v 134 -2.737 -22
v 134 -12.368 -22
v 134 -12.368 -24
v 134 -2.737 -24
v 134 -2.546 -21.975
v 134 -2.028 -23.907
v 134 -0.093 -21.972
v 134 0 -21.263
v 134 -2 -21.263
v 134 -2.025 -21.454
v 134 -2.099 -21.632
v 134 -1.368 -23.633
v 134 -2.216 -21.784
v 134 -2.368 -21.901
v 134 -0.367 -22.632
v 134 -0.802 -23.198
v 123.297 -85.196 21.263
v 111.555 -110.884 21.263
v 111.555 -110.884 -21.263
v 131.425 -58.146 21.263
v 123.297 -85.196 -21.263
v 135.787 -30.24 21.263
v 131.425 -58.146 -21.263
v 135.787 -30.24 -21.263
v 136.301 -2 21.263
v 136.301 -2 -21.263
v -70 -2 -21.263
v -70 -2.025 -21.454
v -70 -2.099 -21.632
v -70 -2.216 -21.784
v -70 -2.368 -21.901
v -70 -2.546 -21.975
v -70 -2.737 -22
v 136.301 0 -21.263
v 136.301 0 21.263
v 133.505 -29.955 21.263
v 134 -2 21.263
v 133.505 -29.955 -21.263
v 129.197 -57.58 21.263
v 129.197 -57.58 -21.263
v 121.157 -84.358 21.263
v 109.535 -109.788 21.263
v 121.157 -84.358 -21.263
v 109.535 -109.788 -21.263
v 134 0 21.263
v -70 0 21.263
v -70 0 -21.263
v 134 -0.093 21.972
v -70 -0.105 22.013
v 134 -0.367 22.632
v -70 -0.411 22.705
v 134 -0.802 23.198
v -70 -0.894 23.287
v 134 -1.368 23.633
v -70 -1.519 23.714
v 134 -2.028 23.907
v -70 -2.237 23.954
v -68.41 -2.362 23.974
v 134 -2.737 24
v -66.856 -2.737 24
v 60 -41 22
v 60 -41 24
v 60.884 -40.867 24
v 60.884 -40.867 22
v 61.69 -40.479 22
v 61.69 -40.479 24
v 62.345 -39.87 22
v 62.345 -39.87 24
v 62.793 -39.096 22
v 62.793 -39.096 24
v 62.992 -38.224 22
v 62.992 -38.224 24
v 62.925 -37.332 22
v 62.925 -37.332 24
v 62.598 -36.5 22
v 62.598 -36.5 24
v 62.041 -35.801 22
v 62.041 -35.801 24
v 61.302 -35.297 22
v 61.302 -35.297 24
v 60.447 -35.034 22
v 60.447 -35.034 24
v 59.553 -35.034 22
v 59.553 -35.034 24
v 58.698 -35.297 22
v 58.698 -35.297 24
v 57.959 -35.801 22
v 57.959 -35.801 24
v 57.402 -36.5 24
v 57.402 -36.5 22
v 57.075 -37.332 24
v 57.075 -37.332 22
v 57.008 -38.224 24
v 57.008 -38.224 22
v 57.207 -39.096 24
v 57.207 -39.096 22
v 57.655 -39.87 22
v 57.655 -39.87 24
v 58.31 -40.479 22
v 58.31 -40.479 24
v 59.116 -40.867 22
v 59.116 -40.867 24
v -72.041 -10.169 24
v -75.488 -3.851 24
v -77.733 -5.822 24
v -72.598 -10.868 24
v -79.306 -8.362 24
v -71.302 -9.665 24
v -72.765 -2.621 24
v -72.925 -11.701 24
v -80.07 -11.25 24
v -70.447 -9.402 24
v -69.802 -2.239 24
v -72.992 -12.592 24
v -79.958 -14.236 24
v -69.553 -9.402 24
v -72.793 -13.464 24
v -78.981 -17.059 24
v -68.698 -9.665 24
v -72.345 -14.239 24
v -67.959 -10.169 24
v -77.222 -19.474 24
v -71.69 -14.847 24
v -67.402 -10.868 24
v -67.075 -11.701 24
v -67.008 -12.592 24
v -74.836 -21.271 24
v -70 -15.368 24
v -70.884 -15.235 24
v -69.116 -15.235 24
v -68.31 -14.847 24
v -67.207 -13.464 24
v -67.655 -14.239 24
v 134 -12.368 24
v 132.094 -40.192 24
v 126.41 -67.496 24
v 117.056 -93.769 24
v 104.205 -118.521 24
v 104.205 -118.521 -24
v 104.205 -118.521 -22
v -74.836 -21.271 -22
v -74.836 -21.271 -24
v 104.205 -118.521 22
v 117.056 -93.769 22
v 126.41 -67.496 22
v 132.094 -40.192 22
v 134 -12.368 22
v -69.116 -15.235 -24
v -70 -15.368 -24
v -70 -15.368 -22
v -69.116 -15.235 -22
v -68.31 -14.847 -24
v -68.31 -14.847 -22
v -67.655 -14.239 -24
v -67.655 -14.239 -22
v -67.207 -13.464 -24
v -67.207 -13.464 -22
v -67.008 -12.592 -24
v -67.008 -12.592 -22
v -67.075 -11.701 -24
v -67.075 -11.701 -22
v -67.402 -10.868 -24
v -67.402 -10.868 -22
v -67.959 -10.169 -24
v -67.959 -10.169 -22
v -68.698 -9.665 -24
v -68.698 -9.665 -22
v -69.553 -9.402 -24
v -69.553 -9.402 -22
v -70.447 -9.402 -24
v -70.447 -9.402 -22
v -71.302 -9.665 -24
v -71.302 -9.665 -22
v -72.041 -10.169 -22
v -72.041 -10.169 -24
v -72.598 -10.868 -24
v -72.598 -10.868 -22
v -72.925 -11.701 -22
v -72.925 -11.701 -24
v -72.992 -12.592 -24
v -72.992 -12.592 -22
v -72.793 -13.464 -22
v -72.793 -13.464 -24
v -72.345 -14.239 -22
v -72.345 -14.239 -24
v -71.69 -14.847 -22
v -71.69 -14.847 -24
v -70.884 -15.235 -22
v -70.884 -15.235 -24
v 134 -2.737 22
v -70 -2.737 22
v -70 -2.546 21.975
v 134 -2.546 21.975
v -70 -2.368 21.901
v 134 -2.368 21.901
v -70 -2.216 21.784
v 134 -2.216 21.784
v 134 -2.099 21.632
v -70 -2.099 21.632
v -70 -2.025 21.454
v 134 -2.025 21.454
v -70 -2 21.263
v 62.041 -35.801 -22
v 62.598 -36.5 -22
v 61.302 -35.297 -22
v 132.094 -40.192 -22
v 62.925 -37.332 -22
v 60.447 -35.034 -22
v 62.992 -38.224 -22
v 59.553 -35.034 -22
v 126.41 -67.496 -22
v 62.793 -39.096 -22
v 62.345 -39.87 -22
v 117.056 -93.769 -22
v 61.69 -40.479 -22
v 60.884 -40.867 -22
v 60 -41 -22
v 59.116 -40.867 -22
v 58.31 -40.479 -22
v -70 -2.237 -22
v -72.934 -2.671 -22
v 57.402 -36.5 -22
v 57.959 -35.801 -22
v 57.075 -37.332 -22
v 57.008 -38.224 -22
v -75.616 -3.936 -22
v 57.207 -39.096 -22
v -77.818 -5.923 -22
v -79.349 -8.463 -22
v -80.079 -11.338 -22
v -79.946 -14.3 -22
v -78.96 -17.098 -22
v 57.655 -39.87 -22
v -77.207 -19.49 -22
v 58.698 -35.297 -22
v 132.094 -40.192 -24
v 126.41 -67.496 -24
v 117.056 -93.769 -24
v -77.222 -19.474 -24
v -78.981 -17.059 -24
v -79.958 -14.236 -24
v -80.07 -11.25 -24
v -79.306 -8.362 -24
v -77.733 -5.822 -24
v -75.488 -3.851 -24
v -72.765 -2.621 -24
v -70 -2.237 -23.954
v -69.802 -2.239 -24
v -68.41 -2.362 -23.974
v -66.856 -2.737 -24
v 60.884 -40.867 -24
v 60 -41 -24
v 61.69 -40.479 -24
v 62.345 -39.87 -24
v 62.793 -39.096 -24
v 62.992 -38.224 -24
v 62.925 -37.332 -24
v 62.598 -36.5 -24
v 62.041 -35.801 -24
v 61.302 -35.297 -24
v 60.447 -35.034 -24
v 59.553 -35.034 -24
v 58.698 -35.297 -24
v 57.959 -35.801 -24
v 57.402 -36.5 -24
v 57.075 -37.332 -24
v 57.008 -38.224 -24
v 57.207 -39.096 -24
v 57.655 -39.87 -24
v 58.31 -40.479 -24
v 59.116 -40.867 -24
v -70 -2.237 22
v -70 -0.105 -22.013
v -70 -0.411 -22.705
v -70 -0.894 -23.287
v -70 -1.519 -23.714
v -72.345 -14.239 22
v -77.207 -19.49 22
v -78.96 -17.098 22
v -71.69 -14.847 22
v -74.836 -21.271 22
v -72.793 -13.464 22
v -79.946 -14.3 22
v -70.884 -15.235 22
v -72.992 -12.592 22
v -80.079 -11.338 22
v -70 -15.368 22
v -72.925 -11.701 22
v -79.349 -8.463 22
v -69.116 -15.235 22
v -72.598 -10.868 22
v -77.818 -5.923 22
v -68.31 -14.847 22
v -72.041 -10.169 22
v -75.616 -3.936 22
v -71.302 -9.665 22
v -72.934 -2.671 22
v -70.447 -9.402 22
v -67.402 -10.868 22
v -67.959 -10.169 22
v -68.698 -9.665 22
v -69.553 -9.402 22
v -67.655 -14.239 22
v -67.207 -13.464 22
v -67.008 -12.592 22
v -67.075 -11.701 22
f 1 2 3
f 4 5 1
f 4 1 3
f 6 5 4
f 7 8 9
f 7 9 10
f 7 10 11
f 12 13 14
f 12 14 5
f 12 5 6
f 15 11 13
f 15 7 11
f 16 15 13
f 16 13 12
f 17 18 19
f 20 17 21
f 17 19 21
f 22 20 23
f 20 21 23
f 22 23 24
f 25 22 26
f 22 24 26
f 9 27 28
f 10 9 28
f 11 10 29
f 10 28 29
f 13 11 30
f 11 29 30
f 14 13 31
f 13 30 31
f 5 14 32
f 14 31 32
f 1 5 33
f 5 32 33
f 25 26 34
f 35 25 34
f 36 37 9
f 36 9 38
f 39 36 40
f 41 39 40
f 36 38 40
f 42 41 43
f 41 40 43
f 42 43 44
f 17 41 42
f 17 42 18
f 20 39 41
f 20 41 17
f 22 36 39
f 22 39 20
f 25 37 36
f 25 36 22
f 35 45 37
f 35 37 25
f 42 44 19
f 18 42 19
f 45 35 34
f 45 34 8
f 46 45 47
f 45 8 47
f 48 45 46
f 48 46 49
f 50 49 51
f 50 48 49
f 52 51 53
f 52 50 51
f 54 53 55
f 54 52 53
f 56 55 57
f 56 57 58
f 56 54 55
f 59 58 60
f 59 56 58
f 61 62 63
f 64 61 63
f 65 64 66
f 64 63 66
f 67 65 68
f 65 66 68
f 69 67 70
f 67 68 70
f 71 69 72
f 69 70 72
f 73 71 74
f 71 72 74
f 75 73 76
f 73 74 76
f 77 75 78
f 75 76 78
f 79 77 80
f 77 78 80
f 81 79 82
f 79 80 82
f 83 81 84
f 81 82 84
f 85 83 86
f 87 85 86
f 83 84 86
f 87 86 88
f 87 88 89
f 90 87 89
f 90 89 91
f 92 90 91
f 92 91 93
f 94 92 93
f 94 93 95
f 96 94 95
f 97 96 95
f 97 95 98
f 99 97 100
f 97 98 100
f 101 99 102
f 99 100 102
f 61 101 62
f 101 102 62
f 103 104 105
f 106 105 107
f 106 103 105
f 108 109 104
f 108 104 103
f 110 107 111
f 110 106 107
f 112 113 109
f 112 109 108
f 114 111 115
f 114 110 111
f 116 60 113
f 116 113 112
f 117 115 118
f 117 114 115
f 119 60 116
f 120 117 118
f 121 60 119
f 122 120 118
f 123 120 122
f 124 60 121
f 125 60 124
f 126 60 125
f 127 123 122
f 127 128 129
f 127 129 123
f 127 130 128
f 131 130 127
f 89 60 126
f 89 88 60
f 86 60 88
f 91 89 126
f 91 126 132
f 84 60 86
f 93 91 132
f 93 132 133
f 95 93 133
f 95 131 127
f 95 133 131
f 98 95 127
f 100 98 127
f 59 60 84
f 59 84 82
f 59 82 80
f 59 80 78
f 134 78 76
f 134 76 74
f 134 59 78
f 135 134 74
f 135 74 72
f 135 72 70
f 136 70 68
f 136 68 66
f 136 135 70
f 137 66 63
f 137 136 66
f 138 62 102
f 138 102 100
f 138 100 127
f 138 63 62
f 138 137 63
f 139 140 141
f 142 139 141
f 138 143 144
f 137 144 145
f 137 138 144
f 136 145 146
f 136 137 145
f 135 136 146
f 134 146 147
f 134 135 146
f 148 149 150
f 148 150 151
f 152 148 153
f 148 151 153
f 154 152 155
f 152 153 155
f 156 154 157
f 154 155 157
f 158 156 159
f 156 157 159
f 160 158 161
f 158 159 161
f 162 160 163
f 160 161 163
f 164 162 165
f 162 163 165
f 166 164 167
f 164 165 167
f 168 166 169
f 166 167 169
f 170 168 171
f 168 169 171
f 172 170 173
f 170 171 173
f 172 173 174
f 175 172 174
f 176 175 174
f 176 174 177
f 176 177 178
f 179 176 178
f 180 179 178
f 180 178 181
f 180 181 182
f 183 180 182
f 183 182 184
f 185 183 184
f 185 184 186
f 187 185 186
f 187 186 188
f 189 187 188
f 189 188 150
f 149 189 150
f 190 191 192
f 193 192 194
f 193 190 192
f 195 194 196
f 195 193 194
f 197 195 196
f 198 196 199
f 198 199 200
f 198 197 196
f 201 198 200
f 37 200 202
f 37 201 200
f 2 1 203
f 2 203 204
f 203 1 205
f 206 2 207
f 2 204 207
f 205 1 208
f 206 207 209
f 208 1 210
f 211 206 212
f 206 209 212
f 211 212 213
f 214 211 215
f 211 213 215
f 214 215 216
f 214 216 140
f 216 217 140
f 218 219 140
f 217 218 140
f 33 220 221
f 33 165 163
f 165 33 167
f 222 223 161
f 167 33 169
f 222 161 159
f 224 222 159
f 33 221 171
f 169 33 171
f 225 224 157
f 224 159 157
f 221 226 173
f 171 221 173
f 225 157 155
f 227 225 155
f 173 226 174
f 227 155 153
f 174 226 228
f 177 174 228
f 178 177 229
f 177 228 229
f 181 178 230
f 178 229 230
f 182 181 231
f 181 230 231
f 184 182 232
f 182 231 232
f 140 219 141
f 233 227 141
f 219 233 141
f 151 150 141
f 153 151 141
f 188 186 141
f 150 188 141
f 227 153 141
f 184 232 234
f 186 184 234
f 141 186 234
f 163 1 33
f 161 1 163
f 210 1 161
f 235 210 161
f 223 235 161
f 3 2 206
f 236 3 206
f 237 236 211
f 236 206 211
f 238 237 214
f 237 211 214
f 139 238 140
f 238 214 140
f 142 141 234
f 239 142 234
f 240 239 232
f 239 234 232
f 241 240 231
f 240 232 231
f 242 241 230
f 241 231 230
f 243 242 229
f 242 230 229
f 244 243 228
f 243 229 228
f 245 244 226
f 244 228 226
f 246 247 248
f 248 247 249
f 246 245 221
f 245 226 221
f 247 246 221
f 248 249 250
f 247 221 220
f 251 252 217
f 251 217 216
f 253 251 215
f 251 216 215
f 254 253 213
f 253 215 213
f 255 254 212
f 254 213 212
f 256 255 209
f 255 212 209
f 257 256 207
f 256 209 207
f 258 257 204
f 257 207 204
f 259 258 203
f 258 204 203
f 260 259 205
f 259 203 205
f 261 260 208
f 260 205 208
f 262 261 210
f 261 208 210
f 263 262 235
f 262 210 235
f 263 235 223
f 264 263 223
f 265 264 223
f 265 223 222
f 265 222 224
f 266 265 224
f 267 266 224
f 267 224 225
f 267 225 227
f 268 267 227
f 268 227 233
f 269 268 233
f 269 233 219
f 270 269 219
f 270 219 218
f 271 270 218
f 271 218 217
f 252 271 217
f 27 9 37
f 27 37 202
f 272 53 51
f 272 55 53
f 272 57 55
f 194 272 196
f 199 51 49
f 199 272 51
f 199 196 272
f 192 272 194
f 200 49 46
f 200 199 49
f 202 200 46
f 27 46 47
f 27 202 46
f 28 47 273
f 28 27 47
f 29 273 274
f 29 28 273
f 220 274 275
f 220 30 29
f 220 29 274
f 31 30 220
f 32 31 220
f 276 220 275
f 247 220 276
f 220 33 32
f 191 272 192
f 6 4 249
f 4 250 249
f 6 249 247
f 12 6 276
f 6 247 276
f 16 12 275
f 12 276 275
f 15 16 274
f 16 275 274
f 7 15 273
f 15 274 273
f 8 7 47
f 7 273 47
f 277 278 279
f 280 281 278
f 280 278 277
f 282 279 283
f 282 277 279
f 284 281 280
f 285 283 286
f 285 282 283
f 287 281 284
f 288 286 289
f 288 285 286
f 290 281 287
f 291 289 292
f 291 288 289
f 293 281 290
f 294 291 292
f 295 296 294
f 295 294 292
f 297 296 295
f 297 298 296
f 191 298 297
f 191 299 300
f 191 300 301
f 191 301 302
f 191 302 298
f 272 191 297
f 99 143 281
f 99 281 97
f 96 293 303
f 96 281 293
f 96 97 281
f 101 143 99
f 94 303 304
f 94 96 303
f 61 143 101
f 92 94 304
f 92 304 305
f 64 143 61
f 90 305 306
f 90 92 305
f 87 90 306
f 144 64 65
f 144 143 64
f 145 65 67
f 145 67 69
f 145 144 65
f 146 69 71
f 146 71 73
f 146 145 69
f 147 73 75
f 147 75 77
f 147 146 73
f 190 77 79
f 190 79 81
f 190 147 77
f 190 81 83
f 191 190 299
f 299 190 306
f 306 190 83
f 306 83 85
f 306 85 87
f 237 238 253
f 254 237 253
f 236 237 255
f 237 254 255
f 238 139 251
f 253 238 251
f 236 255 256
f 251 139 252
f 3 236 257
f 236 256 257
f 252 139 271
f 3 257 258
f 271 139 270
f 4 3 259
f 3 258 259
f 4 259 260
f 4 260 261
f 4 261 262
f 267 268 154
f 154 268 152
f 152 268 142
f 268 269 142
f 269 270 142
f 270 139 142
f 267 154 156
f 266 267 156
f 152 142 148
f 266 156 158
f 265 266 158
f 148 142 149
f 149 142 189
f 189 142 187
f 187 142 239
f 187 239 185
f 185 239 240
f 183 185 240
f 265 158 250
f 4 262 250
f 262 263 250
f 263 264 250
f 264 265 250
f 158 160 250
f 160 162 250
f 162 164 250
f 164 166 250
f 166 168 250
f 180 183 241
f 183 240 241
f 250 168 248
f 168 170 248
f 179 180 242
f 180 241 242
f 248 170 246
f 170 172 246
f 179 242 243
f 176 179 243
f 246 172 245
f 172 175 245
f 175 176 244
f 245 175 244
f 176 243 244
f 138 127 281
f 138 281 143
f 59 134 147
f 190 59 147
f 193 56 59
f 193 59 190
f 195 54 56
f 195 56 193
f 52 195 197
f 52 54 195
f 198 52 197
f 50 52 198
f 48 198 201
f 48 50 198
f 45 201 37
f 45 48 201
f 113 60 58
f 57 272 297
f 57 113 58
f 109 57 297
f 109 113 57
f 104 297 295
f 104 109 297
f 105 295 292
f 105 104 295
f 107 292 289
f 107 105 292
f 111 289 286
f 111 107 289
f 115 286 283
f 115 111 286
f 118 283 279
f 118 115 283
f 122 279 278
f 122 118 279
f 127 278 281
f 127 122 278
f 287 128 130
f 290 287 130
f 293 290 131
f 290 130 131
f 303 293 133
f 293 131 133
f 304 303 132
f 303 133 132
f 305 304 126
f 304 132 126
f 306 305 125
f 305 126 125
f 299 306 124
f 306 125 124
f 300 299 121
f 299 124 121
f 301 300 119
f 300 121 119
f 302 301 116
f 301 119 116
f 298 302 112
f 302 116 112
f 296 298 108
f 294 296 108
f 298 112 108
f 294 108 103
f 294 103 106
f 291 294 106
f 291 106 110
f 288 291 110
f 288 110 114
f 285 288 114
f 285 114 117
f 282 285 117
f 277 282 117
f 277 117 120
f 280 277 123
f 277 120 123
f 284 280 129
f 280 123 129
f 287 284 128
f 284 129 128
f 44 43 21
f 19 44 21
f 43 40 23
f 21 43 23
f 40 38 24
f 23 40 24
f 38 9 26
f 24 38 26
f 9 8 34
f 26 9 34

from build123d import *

# Parameters (mm, degrees)
BASE_FLANGE1_DEPTH           = 2
EDGE_FLANGE1_STRIP_CUT_DEPTH = 140
EDGE_FLANGE1_DEPTH           = 140
EDGE_FLANGE2_STRIP_CUT_DEPTH = 140
EDGE_FLANGE2_DEPTH           = 140
BOSS_EXTRUDE1_DEPTH          = 2
BOSS_EXTRUDE2_START          = -2
BOSS_EXTRUDE2_DEPTH          = 2
SKETCH14_R                   = 10.1317
BOSS_EXTRUDE3_DEPTH          = 2
BOSS_EXTRUDE4_START          = -2
SKETCH15_R                   = 10.131700000000007
BOSS_EXTRUDE4_DEPTH          = 2
FILLET1_R                    = 20
SKETCH16_R                   = 3.0000000000000084
SKETCH16_R_2                 = 3.000000000000008
CUT_EXTRUDE1_DEPTH           = 116.00000000000001
BOSS_EXTRUDE5_DEPTH          = 2
BOSS_EXTRUDE6_DEPTH          = 64
BOSS_EXTRUDE8_START          = 64
BOSS_EXTRUDE8_DEPTH          = 64
SKETCH38_R                   = 3.000000000000008
SKETCH38_R_2                 = 2.9999999999999947
BOSS_EXTRUDE9_DEPTH          = 2
BOSS_EXTRUDE10_START         = -2
SKETCH40_R                   = 3.0000000000000084
BOSS_EXTRUDE10_DEPTH         = 2
CUT_EXTRUDE2_START           = -90
CUT_EXTRUDE2_DEPTH           = 90
SKETCH42_W                   = 17.233890077557817
SKETCH42_H                   = 15.447994732733191
CUT_EXTRUDE3_DEPTH           = 90
BOSS_EXTRUDE11_DEPTH         = 42.5268


# Sheet-metal steps are written as plain solids
with BuildPart() as part:
    # Sketch1 → Base-Flange1 (new body)
    with BuildSketch(Plane(origin=(0, 0, 0), x_dir=(1, 0, 0), z_dir=(0, 1, 0))):
        Polygon((69.99999999999999, 24.000000000000007), (-70.00000000000003, 23.99999999999999), (-70.00000000000003, -24.000000000000018), (69.99999999999999, -24), align=None)
    extrude(amount=-BASE_FLANGE1_DEPTH)

    # Edge-Flange1 strip (across the edge) → Edge-Flange1 strip cut (cut)
    with BuildSketch(Plane(origin=(69.99999999999999, -2, 24), x_dir=(-1.2e-16, -3.49e-15, -1), z_dir=(-1, 0, 1.2e-16))):
        Polygon((-6.736600000000024, -2.0000000000000235), (2.73660000000001, -1.9999999999999907), (2.736600000000003, 9.55e-15), (-6.736600000000031, -2.353e-14), align=None)
    extrude(amount=EDGE_FLANGE1_STRIP_CUT_DEPTH, mode=Mode.SUBTRACT)

    # Edge-Flange1 section (across the edge) → Edge-Flange1 (add)
    with BuildSketch(Plane(origin=(69.99999999999999, -2, 24), x_dir=(-1.2e-16, -3.49e-15, -1), z_dir=(-1, 0, 1.2e-16))):
        with BuildLine():
            Line((0, 0.7366000000000096), (0, 20.000000000000004))
            Line((0, 20.000000000000004), (2, 20.000000000000004))
            Line((2, 20.000000000000004), (2, 0.7366000000000096))
            ThreePointArc((2, 0.7366000000000096), (2.21574514497799, 0.21574514497799768), (2.736600000000003, 9.55e-15))
            Line((2.736600000000003, 9.55e-15), (2.73660000000001, -1.9999999999999907))
            ThreePointArc((2.73660000000001, -1.9999999999999907), (0.8015315826048977, -1.1984684173951), (0, 0.7366000000000096))
        make_face()
    extrude(amount=EDGE_FLANGE1_DEPTH)

    # Edge-Flange2 strip (across the edge) → Edge-Flange2 strip cut (cut)
    with BuildSketch(Plane(origin=(-70.00000000000003, -2, -23.999999999999993), x_dir=(1.2e-16, -3.49e-15, 1), z_dir=(1, 0, -1.2e-16))):
        Polygon((-6.736600000000024, -2.0000000000000235), (2.73660000000001, -1.9999999999999907), (2.736600000000003, 9.55e-15), (-6.736600000000031, -2.353e-14), align=None)
    extrude(amount=EDGE_FLANGE2_STRIP_CUT_DEPTH, mode=Mode.SUBTRACT)

    # Edge-Flange2 section (across the edge) → Edge-Flange2 (add)
    with BuildSketch(Plane(origin=(-70.00000000000003, -2, -23.999999999999993), x_dir=(1.2e-16, -3.49e-15, 1), z_dir=(1, 0, -1.2e-16))):
        with BuildLine():
            Line((0, 0.7366000000000096), (0, 20.000000000000004))
            Line((0, 20.000000000000004), (2, 20.000000000000004))
            Line((2, 20.000000000000004), (2, 0.7366000000000096))
            ThreePointArc((2, 0.7366000000000096), (2.21574514497799, 0.21574514497799768), (2.736600000000003, 9.55e-15))
            Line((2.736600000000003, 9.55e-15), (2.73660000000001, -1.9999999999999907))
            ThreePointArc((2.73660000000001, -1.9999999999999907), (0.8015315826048977, -1.1984684173951), (0, 0.7366000000000096))
        make_face()
    extrude(amount=EDGE_FLANGE2_DEPTH)

    # Sketch12 → Boss-Extrude1 (add)
    with BuildSketch(Plane.XY.offset(24)):
        with BuildLine():
            Line((69.99999999999997, -38.00000000000009), (69.99999999999997, -5.0936152776594525))
            Line((69.99999999999997, -5.0936152776594525), (49.99999999999997, -5.093615277659455))
            Line((49.99999999999997, -5.093615277659455), (49.99999999999997, -38.00000000000009))
            ThreePointArc((49.99999999999997, -38.00000000000009), (59.99999999999997, -48.000000000000085), (69.99999999999997, -38.00000000000009))
        make_face()
    extrude(amount=-BOSS_EXTRUDE1_DEPTH)

    # Sketch13 → Boss-Extrude2 (add)
    with BuildSketch(Plane(origin=(-2.97e-15, 8.743e-14, -23.999999999999986), x_dir=(-1, 0, 1.2e-16), z_dir=(-1.2e-16, 3.63e-15, -1)).offset(BOSS_EXTRUDE2_START)):
        with BuildLine():
            Line((-49.99999999999997, -21.999999999999922), (-49.99999999999997, -2.736599999999933))
            Line((-49.99999999999997, -2.736599999999933), (-69.99999999999999, -2.7365999999999113))
            Line((-69.99999999999999, -2.7365999999999113), (-69.99999999999997, -37.99999999999992))
            ThreePointArc((-69.99999999999997, -37.99999999999992), (-59.99999999999997, -47.999999999999915), (-49.99999999999997, -37.999999999999915))
            Line((-49.99999999999997, -37.999999999999915), (-49.99999999999997, -21.999999999999922))
        make_face()
    extrude(amount=BOSS_EXTRUDE2_DEPTH)

    # Sketch14 → Boss-Extrude3 (add)
    with BuildSketch(Plane.XY.offset(24)):
        with Locations((-70.00000000000003, -12.368300000000078)):
            Circle(SKETCH14_R)
    extrude(amount=-BOSS_EXTRUDE3_DEPTH)

    # Sketch15 → Boss-Extrude4 (add)
    with BuildSketch(Plane(origin=(-2.97e-15, 8.743e-14, -23.999999999999986), x_dir=(-1, 0, 1.2e-16), z_dir=(-1.2e-16, 3.63e-15, -1)).offset(BOSS_EXTRUDE4_START)):
        with Locations((70.00000000000003, -12.368300000000081)):
            Circle(SKETCH15_R)
    extrude(amount=BOSS_EXTRUDE4_DEPTH)

    # Fillet1
    fillet1_edges = [part.edges().sort_by_distance(p)[0] for p in [
        (49.99999999999997, -22.000000000000007, -23.000000000000075),
        (49.99999999999997, -22.000000000000007, 23.000000000000036),
    ]]
    fillet(fillet1_edges, radius=FILLET1_R)

    # Sketch16 → Cut-Extrude1 (cut)
    with BuildSketch(Plane.XY.offset(24)):
        with Locations(Location((59.99999999999997, -38.000000000000085, 0), (0, 0, 270))):
            Circle(SKETCH16_R)
        with Locations(Location((-70.00000000000003, -12.368300000000078, 0), (0, 0, 270))):
            Circle(SKETCH16_R_2)
    extrude(amount=-CUT_EXTRUDE1_DEPTH, mode=Mode.SUBTRACT)

    # Sketch23 → Boss-Extrude5 (add)
    with BuildSketch(Plane(origin=(0, 0, 0), x_dir=(1, 0, 0), z_dir=(0, 1, 0))):
        Polygon((69.99999999999999, 21.263400000000036), (149.99999999999997, 21.263400000000036), (149.99999999999997, -17.83002853781927), (149.99999999999997, -21.2634), (69.99999999999999, -21.2634), align=None)
    extrude(amount=-BOSS_EXTRUDE5_DEPTH)

    # Sketch31 → Boss-Extrude6 (add)
    with BuildSketch(Plane(origin=(69.99999999999999, 0, 0), x_dir=(0, 0, -1), z_dir=(1, 0, 0))):
        with BuildLine():
            Line((21.999999999999993, -2.736599999999998), (22.00000000000014, -37.99999999999992))
            Line((22.00000000000014, -37.99999999999992), (24.00000000000013, -37.99999999999983))
            Line((24.00000000000013, -37.99999999999983), (24, -2.736599999999978))
            ThreePointArc((24, -2.736599999999978), (23.198468417395112, -0.8015315826048983), (21.263400000000036, 0))
            Line((21.263400000000036, 0), (21.263400000000008, -2.000000000000007))
            ThreePointArc((21.263400000000008, -2.000000000000007), (21.78425485502201, -2.2157451449779955), (21.999999999999993, -2.736599999999998))
        make_face()
    extrude(amount=BOSS_EXTRUDE6_DEPTH)

    # Sketch37 → Boss-Extrude8 (add)
    with BuildSketch(Plane(origin=(69.99999999999999, 0, -8.67e-15), x_dir=(-1.2e-16, 0, -1), z_dir=(1, 0, -1.2e-16)).offset(BOSS_EXTRUDE8_START)):
        with BuildLine():
            Line((-24.000000000000007, -2.736599999999984), (-24.000000000000007, -38.00000000000001))
            Line((-24.000000000000007, -38.00000000000001), (-22.00000000000013, -38.00000000000001))
            Line((-22.00000000000013, -38.00000000000001), (-22.000000000000007, -2.736599999999991))
            ThreePointArc((-22.000000000000007, -2.736599999999991), (-21.784254855022017, -2.215745144977985), (-21.263400000000008, -2.0000000000000018))
            Line((-21.263400000000008, -2.0000000000000018), (-21.263400000000008, 0))
            ThreePointArc((-21.263400000000008, 0), (-23.198468417395112, -0.8015315826048868), (-24.000000000000007, -2.736599999999984))
        make_face()
    extrude(amount=-BOSS_EXTRUDE8_DEPTH)

    # Sketch38 → Boss-Extrude9 (add)
    with BuildSketch(Plane.XY.offset(24)):
        with BuildLine():
            ThreePointArc((-70.00000000000003, -2.2366000000000525), (-79.81974909015226, -9.873530933241609), (-74.83591228983121, -21.271406043121214))
            Line((-74.83591228983121, -21.271406043121214), (104.20534041751986, -118.52148822351042))
            ThreePointArc((104.20534041751986, -118.52148822351043), (127.65743204047538, -62.8414568179052), (133.77238644648855, -2.7342706299537234))
            Line((133.77238644648853, -2.734270629953711), (-69.95051125882394, -2.236720865704318))
            Line((-69.95051125882394, -2.236720865704318), (-70.00000000000003, -2.2366000000000574))
        make_face()
        with Locations((-70.00000000000003, -12.368300000000078)):
            Circle(SKETCH38_R, mode=Mode.SUBTRACT)
        with Locations((59.99999999999997, -38.000000000000085)):
            Circle(SKETCH38_R_2, mode=Mode.SUBTRACT)
    extrude(amount=-BOSS_EXTRUDE9_DEPTH)

    # Sketch40 → Boss-Extrude10 (add)
    with BuildSketch(Plane(origin=(-2.97e-15, 8.743e-14, -23.999999999999986), x_dir=(-1, 0, 1.2e-16), z_dir=(-1.2e-16, 3.64e-15, -1)).offset(BOSS_EXTRUDE10_START)):
        with BuildLine():
            Line((-133.99999999999997, -37.99999999999992), (-132.38333912432114, -37.99999999999992))
            ThreePointArc((-132.38333912432114, -37.99999999999992), (-122.55047625544603, -79.7501528522397), (-104.20534041751992, -118.52148822351012))
            Line((-104.20534041751992, -118.52148822351012), (74.83591228983121, -21.27140604312103))
            ThreePointArc((74.83591228983121, -21.27140604312103), (79.81974909015223, -9.873530933241451), (70.00000000000003, -2.236599999999915))
            Line((70.00000000000003, -2.236599999999915), (70.00000000000003, -2.7365999999999118))
            Line((70.00000000000003, -2.7365999999999118), (-133.99999999999997, -2.7365999999999118))
            Line((-133.99999999999997, -2.7365999999999118), (-133.99999999999997, -37.99999999999992))
        make_face()
        with Locations(Location((-59.99999999999997, -37.999999999999915, 0), (0, 0, 270))):
            Circle(SKETCH40_R, mode=Mode.SUBTRACT)
        with Locations(Location((70.00000000000003, -12.368300000000081, 0), (0, 0, 270))):
            Circle(SKETCH40_R, mode=Mode.SUBTRACT)
    extrude(amount=BOSS_EXTRUDE10_DEPTH)

    # Sketch41 → Cut-Extrude2 (cut)
    with BuildSketch(Plane(origin=(-2.97e-15, 8.743e-14, -23.999999999999986), x_dir=(-1, 0, 1.2e-16), z_dir=(-1.2e-16, 3.64e-15, -1)).offset(CUT_EXTRUDE2_START)):
        with BuildLine():
            Line((-133.99999999999991, -12.368300000000081), (-149.94232536885565, -45.23983757324427))
            Line((-149.94232536885565, -45.23983757324427), (-130.36666577541695, -50.69843495987621))
            ThreePointArc((-130.36666577541695, -50.69843495987621), (-133.08963515918902, -31.619276362446172), (-133.99999999999991, -12.368300000000081))
        make_face()
    extrude(amount=CUT_EXTRUDE2_DEPTH, mode=Mode.SUBTRACT)

    # Sketch42 → Cut-Extrude3 (cut)
    with BuildSketch(Plane(origin=(0, 0, -21.263400000000036), x_dir=(-1, 0, 0), z_dir=(0, 0, -1))):
        with Locations((-144.91808666667805, -5.115479942404007)):
            Rectangle(SKETCH42_W, SKETCH42_H)
    extrude(amount=-CUT_EXTRUDE3_DEPTH, mode=Mode.SUBTRACT)

    # Sketch43 → Boss-Extrude11 (add)
    with BuildSketch(Plane(origin=(0, 0, -21.263400000000036), x_dir=(-1, 0, 0), z_dir=(0, 0, -1))):
        with BuildLine():
            Line((-109.53531100208852, -109.78787579600389), (-111.55529945125834, -110.88396333851894))
            ThreePointArc((-111.55529945125834, -110.88396333851894), (-131.48462736674514, -57.8832164203161), (-136.27341292027893, -1.4622556169704357))
            Line((-136.27341292027893, -1.4622556169704357), (-133.93880439229082, -0.8589252153757276))
            ThreePointArc((-133.93880439229082, -0.8589252153757276), (-129.32254855641568, -57.02278781326821), (-109.53531100208852, -109.78787579600389))
        make_face()
    extrude(amount=-BOSS_EXTRUDE11_DEPTH)


solid = part.part
